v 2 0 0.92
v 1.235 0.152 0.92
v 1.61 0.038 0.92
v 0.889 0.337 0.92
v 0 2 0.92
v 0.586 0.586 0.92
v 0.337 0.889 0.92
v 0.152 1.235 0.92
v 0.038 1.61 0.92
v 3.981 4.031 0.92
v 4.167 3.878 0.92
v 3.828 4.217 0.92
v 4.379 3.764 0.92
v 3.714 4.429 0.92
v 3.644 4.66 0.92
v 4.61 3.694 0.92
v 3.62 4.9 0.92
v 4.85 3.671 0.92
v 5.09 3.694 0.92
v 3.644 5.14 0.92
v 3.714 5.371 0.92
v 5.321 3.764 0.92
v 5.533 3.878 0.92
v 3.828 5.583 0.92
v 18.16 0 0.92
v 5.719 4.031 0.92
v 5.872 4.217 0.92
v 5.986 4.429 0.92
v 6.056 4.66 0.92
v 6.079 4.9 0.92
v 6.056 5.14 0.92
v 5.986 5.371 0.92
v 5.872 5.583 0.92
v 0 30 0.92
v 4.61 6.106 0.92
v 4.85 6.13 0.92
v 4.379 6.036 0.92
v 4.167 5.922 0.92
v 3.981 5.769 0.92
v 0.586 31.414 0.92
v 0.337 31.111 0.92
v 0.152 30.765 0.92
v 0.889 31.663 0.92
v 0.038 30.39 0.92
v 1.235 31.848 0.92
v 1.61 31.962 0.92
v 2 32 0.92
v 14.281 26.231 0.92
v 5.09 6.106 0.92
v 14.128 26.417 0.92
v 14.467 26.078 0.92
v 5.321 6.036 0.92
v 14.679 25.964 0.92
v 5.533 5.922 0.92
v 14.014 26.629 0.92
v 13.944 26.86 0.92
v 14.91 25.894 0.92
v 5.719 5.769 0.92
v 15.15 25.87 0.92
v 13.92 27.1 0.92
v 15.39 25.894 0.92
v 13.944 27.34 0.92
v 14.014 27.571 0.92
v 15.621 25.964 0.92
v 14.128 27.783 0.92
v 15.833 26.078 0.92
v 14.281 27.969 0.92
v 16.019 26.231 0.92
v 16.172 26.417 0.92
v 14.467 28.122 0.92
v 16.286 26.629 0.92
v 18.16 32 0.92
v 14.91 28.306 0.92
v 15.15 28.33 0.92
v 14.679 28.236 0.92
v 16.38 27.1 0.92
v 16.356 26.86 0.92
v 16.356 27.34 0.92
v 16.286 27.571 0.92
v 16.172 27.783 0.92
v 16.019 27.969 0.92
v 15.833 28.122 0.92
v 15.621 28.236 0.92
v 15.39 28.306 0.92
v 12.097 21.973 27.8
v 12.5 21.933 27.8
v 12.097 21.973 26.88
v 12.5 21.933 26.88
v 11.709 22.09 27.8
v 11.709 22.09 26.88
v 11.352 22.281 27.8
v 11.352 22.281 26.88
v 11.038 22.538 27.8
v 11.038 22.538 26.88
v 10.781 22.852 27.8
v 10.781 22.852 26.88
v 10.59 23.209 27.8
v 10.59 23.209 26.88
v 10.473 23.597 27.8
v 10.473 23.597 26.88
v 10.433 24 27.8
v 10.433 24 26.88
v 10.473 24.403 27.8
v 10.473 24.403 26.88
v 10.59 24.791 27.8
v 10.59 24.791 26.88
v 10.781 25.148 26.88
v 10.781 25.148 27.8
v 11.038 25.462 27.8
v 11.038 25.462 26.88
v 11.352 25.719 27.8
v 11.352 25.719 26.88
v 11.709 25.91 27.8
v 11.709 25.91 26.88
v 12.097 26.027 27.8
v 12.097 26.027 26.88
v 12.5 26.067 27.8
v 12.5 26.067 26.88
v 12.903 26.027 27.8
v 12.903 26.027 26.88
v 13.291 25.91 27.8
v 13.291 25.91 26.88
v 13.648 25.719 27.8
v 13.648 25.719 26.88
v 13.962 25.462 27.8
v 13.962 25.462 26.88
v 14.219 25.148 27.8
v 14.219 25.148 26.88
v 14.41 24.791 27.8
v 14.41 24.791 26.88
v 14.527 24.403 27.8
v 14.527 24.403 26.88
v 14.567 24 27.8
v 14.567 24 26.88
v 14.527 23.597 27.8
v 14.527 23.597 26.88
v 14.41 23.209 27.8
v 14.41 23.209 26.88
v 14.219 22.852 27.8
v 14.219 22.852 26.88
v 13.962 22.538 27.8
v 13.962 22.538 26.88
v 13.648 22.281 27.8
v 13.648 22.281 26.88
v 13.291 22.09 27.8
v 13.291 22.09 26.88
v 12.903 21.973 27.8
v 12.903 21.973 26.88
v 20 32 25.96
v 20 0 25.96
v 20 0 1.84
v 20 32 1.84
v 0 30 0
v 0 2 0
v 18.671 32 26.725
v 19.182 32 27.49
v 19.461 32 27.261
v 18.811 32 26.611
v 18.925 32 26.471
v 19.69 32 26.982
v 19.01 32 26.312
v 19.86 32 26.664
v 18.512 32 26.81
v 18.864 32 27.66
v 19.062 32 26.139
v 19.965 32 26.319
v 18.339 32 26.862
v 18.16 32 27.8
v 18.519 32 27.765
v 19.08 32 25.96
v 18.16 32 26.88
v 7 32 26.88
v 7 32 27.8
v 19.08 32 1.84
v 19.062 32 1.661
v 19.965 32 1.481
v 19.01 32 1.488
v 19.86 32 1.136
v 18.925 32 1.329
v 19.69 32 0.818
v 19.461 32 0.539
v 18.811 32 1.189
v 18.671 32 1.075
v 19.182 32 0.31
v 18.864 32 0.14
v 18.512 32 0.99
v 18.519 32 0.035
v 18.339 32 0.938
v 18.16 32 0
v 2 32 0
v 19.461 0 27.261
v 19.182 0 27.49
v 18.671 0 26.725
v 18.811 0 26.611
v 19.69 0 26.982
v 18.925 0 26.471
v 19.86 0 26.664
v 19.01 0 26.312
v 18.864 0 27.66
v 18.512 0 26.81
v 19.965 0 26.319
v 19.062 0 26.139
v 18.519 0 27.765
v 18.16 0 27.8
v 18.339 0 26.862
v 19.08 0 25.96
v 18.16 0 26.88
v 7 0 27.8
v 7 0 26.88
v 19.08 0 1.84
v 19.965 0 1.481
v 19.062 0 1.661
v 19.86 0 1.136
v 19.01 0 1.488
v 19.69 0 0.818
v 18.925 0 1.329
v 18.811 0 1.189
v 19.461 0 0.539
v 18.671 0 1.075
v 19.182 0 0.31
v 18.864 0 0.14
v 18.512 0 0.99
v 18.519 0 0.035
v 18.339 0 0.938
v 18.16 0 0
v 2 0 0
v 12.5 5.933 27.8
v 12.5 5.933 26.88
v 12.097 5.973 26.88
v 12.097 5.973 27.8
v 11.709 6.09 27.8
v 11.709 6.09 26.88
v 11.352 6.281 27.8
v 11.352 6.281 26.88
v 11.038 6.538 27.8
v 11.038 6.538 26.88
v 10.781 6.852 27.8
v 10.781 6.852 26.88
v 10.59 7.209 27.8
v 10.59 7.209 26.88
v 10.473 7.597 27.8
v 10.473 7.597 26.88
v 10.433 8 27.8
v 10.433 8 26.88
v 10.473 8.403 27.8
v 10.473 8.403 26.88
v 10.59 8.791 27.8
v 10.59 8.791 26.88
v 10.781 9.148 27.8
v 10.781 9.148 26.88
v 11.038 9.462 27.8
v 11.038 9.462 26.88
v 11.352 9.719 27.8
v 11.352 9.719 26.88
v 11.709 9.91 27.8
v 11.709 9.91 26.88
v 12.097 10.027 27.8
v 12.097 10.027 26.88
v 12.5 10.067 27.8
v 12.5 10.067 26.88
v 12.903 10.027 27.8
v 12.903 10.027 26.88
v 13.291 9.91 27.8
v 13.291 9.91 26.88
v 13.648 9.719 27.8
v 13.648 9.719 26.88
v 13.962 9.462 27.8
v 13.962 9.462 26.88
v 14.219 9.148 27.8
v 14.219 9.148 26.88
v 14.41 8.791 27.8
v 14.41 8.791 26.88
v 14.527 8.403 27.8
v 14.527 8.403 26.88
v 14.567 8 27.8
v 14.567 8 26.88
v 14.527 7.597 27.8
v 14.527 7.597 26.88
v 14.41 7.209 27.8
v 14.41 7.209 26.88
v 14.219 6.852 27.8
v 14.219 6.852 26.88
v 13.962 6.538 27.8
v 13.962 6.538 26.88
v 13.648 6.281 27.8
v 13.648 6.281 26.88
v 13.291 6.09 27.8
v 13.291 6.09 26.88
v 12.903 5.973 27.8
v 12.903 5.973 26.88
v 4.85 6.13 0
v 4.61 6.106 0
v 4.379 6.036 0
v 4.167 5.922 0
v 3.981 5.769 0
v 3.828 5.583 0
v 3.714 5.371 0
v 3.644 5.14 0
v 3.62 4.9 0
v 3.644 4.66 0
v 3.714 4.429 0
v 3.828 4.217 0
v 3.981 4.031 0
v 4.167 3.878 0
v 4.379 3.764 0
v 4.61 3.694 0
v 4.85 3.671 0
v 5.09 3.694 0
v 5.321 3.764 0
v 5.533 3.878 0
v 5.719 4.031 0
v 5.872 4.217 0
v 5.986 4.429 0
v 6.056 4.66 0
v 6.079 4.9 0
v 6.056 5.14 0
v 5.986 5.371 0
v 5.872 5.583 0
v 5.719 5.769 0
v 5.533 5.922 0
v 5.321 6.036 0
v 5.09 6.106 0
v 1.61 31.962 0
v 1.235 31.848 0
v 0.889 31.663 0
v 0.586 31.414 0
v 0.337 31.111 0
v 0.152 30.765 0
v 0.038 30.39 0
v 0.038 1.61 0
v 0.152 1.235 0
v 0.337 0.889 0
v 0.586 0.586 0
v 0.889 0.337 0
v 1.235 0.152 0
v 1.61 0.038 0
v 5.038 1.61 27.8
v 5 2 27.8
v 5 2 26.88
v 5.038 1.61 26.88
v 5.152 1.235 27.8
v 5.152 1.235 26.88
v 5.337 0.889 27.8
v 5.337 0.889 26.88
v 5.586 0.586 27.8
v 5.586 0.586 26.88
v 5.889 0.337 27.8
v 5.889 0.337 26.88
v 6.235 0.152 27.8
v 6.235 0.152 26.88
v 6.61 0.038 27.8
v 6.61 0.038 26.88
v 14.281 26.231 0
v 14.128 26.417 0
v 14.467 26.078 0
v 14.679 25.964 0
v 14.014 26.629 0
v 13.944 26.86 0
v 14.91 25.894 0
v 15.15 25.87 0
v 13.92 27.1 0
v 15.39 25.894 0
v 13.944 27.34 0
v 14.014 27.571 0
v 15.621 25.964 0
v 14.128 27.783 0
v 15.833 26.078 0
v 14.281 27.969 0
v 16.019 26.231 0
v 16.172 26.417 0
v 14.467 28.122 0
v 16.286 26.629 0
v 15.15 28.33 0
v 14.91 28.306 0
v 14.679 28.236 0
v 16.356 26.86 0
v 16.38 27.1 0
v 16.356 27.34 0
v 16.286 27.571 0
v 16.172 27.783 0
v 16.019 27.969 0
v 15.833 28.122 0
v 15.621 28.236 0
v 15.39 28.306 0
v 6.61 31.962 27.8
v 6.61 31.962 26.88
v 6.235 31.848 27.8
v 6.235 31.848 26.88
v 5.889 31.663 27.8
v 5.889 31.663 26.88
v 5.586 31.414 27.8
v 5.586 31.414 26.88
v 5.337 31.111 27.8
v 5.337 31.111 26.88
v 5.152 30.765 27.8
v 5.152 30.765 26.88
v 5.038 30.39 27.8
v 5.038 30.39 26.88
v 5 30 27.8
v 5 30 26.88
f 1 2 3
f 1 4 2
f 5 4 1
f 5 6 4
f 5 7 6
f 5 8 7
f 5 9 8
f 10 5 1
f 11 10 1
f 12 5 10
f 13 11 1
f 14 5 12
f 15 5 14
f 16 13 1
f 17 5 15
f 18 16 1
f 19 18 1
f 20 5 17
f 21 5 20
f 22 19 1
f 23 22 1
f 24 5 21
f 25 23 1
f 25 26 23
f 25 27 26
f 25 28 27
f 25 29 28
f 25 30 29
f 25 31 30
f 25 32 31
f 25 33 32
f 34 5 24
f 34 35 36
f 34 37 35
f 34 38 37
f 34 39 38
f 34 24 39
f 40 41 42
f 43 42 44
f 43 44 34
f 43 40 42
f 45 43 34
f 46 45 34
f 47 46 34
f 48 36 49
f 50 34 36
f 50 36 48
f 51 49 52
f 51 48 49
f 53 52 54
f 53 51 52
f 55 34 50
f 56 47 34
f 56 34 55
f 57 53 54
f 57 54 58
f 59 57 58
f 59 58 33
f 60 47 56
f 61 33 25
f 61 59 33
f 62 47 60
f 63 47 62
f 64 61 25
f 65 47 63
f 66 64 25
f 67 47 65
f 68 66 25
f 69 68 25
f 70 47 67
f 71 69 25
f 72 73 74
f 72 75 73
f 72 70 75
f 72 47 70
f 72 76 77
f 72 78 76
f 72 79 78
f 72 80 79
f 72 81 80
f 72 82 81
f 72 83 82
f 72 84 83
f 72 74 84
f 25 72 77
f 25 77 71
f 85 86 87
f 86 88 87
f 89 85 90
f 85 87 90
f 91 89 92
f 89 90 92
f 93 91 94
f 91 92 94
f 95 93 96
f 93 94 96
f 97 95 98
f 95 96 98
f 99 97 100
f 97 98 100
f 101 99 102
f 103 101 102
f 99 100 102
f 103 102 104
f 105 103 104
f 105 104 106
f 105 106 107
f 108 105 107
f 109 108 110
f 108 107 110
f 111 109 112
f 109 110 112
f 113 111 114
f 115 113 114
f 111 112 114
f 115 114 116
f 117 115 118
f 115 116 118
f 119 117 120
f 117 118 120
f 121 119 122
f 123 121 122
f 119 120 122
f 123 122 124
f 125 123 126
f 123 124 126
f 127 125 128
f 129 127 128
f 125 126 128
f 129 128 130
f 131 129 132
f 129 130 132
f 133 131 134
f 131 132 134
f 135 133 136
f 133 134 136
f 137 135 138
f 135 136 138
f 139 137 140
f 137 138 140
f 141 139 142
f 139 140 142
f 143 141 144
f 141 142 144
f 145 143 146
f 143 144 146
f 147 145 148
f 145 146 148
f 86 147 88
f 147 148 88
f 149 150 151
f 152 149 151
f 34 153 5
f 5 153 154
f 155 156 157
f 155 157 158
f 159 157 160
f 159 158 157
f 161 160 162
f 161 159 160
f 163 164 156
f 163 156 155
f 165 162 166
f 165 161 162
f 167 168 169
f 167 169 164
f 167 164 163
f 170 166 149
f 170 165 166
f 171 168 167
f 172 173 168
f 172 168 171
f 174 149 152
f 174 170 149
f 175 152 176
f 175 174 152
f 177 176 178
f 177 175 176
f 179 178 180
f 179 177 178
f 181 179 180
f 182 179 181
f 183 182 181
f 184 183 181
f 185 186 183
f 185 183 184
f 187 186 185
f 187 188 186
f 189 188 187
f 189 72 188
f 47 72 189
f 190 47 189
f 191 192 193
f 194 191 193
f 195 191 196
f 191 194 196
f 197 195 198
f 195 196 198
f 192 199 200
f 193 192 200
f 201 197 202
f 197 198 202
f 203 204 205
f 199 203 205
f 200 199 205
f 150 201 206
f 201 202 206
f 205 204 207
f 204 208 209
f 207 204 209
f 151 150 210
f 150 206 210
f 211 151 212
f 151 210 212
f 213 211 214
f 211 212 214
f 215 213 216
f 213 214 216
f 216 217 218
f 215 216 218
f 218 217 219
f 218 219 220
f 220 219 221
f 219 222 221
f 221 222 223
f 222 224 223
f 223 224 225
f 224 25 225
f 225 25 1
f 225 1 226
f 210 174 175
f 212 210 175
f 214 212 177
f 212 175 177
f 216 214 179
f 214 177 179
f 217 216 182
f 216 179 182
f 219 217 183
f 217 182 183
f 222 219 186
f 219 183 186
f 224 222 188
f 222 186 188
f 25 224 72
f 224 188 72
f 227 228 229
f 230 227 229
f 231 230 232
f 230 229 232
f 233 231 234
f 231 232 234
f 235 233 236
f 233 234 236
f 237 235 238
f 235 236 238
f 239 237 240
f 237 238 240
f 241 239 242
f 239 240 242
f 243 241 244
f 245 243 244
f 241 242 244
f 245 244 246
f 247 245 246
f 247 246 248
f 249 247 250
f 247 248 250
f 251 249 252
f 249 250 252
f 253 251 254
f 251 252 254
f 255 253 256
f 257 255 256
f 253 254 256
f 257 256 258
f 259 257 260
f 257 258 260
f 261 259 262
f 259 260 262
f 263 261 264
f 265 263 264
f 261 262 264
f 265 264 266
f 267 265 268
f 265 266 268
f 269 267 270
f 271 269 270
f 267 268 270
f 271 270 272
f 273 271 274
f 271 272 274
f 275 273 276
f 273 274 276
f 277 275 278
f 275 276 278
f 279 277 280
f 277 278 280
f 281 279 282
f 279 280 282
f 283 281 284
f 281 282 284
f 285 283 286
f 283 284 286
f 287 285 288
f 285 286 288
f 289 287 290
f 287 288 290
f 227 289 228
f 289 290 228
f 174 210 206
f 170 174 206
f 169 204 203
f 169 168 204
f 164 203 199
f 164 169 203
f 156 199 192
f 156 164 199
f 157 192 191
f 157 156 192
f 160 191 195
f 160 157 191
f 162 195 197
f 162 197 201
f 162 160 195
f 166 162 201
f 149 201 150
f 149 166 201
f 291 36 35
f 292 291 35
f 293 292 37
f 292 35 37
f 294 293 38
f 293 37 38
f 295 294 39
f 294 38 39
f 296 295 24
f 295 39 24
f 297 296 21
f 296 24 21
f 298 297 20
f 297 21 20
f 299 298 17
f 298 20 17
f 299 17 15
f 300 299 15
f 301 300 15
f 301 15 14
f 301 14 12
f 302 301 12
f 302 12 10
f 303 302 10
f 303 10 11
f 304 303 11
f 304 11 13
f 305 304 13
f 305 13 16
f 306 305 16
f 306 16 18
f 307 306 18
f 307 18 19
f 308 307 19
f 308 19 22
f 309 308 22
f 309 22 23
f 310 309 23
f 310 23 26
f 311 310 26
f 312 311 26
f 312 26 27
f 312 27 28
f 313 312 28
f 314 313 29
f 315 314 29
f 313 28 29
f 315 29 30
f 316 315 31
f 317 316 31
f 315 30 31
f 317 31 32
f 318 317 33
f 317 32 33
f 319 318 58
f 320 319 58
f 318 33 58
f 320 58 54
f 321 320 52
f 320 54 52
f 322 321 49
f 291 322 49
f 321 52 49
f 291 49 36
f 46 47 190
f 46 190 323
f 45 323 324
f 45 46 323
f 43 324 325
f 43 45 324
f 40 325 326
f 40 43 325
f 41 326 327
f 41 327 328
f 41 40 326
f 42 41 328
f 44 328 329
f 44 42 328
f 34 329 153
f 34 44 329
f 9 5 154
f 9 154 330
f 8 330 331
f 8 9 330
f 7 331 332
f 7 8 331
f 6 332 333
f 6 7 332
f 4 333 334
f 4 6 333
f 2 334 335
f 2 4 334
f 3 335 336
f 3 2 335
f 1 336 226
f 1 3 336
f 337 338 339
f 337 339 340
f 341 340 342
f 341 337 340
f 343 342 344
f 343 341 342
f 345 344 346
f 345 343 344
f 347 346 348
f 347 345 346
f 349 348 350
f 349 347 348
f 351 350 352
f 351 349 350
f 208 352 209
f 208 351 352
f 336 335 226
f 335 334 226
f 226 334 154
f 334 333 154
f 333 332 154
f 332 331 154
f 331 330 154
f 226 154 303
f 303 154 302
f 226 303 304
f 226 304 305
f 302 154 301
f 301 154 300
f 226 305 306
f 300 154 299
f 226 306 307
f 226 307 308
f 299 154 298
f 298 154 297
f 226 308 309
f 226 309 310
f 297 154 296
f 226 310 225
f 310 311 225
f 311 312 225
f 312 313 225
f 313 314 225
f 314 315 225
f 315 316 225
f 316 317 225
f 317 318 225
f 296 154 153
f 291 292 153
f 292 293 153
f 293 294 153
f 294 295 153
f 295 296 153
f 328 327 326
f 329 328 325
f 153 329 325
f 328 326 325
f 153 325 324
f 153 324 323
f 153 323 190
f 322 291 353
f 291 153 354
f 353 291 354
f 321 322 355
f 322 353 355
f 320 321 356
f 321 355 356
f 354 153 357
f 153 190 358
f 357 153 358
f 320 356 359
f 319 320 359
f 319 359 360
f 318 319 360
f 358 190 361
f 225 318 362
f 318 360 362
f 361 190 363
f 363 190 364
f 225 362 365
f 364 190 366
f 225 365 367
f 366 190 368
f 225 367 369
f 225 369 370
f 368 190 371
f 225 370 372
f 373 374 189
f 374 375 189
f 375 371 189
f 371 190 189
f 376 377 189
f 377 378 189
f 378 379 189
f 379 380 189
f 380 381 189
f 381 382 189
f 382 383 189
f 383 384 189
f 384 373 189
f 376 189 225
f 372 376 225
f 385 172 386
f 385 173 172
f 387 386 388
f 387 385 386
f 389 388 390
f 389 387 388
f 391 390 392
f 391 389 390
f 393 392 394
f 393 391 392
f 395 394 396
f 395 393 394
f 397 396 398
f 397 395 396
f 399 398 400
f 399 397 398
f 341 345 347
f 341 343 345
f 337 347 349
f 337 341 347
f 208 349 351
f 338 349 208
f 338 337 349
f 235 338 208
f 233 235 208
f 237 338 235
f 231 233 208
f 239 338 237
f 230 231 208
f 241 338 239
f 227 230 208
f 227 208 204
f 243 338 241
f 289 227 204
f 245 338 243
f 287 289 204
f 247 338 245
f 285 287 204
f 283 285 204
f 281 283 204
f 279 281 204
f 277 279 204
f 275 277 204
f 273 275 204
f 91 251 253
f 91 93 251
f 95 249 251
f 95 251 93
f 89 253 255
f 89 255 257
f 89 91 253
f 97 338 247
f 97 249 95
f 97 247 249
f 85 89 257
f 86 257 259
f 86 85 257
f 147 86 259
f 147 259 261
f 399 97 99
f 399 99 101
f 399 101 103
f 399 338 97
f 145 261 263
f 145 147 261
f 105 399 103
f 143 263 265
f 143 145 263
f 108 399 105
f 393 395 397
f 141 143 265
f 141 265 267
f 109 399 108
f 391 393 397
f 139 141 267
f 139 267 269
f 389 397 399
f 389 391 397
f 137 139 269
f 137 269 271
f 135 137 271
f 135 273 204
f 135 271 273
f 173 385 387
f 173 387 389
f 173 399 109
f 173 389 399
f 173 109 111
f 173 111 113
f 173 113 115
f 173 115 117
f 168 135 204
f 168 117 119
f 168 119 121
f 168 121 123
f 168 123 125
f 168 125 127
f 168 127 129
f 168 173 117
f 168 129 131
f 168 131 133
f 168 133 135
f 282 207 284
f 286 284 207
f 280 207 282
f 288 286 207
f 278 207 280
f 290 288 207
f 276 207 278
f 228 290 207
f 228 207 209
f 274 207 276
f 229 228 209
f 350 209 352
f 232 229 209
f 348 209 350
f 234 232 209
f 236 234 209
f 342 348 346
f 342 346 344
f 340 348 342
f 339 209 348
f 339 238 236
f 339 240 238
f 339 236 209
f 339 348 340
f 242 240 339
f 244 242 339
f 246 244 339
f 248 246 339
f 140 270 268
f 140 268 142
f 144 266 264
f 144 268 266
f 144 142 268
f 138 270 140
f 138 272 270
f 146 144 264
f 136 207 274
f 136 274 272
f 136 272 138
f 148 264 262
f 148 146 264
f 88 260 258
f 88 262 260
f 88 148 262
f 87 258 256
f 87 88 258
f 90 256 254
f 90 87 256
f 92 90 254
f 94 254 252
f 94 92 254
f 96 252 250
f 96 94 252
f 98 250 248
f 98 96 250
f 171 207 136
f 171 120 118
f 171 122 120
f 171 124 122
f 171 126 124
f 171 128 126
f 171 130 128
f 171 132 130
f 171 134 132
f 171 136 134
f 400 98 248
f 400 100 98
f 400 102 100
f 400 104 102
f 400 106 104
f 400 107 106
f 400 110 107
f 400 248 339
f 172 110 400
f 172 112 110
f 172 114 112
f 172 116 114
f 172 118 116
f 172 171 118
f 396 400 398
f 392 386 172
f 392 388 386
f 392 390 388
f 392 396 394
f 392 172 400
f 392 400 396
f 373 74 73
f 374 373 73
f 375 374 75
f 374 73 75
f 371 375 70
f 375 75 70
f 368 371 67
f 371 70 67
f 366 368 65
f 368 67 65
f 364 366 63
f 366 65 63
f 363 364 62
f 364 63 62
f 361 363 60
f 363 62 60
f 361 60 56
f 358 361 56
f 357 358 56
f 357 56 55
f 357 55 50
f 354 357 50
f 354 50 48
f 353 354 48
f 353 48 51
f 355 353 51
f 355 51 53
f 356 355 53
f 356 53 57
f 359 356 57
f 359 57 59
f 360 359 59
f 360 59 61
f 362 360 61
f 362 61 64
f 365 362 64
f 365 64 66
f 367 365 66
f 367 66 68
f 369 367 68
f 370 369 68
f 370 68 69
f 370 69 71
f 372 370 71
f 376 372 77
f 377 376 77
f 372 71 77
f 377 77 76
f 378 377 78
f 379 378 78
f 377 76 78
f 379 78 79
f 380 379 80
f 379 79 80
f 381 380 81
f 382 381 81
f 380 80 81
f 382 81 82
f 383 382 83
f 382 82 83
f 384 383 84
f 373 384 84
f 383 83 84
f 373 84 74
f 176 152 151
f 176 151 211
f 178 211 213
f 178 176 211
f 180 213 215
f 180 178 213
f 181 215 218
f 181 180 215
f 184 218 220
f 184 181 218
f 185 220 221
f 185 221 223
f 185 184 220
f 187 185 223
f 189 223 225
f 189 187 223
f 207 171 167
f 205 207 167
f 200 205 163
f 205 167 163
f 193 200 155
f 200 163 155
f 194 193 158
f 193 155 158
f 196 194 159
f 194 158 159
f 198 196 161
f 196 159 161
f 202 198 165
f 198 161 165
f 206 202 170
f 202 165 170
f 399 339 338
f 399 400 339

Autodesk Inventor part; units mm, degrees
ref_plane "YZ Plane" through (0, 0, 0) normal (1, 0, 0) x (0, 1, 0)
ref_plane "XZ Plane" through (0, 0, 0) normal (0, 1, 0) x (-1, 0, 0)
ref_plane "XY Plane" through (0, 0, 0) normal (0, 0, 1) x (1, 0, 0)
sketch "Sketch2" plane through (0, 0, 0) normal (0, 0, 1) x (1, 0, 0)
  line L0 (0, 0) -> (20, 0)
  line L1 (20, 0) -> (20, 32)
  line L2 (20, 32) -> (0, 32)
  line L3 (0, 32) -> (0, 0)
  dimension "d0" = 20
  dimension "d1" = 32
extrude "Plate1" add sketch "Sketch2" along normal blind 0.92
sketch "Sketch3" plane through (19.08, 32, 0) normal (1, 0, 0) x (0, 1, 0)
  line L0 (-32, 0) -> (0, 0)
  line L1 (0, 0) -> (0, 27.8)
  line L2 (0, 27.8) -> (-32, 27.8)
  line L3 (-32, 27.8) -> (-32, 0)
edge flange "Flange1" height 27.8 angle 90 thickness 0.92 bend radius 0.92 thickness toward (1, 0, 0) relief tear relief width 0.92 relief depth 0.46 edges at (20, 16, 0.92) wall of the first edge with corners at (19.08, 0, 0) (19.08, 32, 0) (19.08, 32, 27.8) (19.08, 0, 27.8)
bend "Bend1"
corner "Corner1"
sketch "Sketch4" plane through (20, 32, 26.88) normal (0, 0, 1) x (1, 0, 0)
  line L0 (0, -32) -> (0, 0)
  line L1 (0, 0) -> (-15, 0)
  line L2 (-15, 0) -> (-15, -32)
  line L3 (-15, -32) -> (0, -32)
edge flange "Flange2" height 15 angle 90 thickness 0.92 bend radius 0.92 thickness toward (0, 0, 1) relief tear relief width 0.92 relief depth 0.46 edges at (19.08, 16, 27.8) wall of the first edge with corners at (20, 0, 26.88) (20, 32, 26.88) (5, 32, 26.88) (5, 0, 26.88)
bend "Bend2"
corner "Corner2"
fillet "Fillet2" radius 2 4 edges at (0, 0, 0.46) (5, 32, 27.34) (5, 0, 27.34) (0, 32, 0.46)
sketch "Sketch5" plane through (0, 0, 0) normal (0, 0, -1) x (-1, 0, 0)
  line L0 (-20, 0) -> (-20, 32) projected
  line L1 (-18.16, 32) -> (-2, 32) projected
  line L2 (0, 30) -> (0, 2) projected
  line L3 (-2, 0) -> (-18.16, 0) projected
  point P0 (0, 0)
  point P1 (-15.15, 27.1)
  point P2 (-4.85, 4.9)
  dimension "d35" = 4.85
  dimension "d36" = 4.9
  dimension "d37" = 4.9
  dimension "d38" = 4.85
hole "Hole1" at (15.15, 27.1, 0) at (4.85, 4.9, 0) direction (0, 0, 1) diameter 2.459 depth 2 tip angle 137 thread size "M3x0.5" class "6H" standard "ISO Metric profile"
sketch "Sketch6" plane through (18.16, 0, 27.8) normal (0, 0, 1) x (1, 0, 0)
  line L0 (-11.16, 32) -> (0, 32) projected
  line L1 (0, 0) -> (-11.16, 0) projected
  line L2 (-13.16, 2) -> (-13.16, 30) projected
  point P0 (-18.16, 0)
  point P1 (-5.66, 24)
  point P2 (-5.66, 8)
  dimension "d46" = 8
  dimension "d47" = 8
  dimension "d48" = 7.5
  dimension "d49" = 7.5
hole "Hole2" at (12.5, 24, 27.8) at (12.5, 8, 27.8) direction (0, 0, -1) diameter 4.134 depth 2 tip angle 137 thread size "M5x0.8" class "6H" standard "ISO Metric profile"
equation "\"d2\" = Thickness"
equation "\"d3\" = BendReliefWidth"
equation "\"d4\" = BendReliefDepth"
equation "\"d5\" = MinimumRemnant"
equation "\"d6\" = TransitionRadius"
equation "\"d9\" = BendRadius"
equation "\"d10\" = CornerReliefSize"
equation "\"d11\" = GapSize"
equation "\"d12\" = JacobiRadiusSize"
equation "\"d13\" = BendReliefWidth"
equation "\"d14\" = BendReliefDepth"
equation "\"d15\" = MinimumRemnant"
equation "\"d16\" = TransitionRadius"
equation "\"d19\" = BendRadius"
equation "\"d20\" = CornerReliefSize"
equation "\"d21\" = GapSize"
equation "\"d22\" = JacobiRadiusSize"
equation "\"BendRadius\" = Thickness"
equation "\"BendReliefWidth\" = Thickness"
equation "\"BendReliefDepth\" = 0.5 * Thickness"
equation "\"CornerReliefSize\" = 4 * Thickness"
equation "\"MinimumRemnant\" = 2 * Thickness"
equation "\"TransitionRadius\" = BendRadius"
equation "\"JacobiRadiusSize\" = BendRadius"
equation "\"GapSize\" = Thickness"
equation "\"Thickness\" = 0.92"
properties part number "Soporte final de carrera" material "Steel AISI 1006 85 HR"
